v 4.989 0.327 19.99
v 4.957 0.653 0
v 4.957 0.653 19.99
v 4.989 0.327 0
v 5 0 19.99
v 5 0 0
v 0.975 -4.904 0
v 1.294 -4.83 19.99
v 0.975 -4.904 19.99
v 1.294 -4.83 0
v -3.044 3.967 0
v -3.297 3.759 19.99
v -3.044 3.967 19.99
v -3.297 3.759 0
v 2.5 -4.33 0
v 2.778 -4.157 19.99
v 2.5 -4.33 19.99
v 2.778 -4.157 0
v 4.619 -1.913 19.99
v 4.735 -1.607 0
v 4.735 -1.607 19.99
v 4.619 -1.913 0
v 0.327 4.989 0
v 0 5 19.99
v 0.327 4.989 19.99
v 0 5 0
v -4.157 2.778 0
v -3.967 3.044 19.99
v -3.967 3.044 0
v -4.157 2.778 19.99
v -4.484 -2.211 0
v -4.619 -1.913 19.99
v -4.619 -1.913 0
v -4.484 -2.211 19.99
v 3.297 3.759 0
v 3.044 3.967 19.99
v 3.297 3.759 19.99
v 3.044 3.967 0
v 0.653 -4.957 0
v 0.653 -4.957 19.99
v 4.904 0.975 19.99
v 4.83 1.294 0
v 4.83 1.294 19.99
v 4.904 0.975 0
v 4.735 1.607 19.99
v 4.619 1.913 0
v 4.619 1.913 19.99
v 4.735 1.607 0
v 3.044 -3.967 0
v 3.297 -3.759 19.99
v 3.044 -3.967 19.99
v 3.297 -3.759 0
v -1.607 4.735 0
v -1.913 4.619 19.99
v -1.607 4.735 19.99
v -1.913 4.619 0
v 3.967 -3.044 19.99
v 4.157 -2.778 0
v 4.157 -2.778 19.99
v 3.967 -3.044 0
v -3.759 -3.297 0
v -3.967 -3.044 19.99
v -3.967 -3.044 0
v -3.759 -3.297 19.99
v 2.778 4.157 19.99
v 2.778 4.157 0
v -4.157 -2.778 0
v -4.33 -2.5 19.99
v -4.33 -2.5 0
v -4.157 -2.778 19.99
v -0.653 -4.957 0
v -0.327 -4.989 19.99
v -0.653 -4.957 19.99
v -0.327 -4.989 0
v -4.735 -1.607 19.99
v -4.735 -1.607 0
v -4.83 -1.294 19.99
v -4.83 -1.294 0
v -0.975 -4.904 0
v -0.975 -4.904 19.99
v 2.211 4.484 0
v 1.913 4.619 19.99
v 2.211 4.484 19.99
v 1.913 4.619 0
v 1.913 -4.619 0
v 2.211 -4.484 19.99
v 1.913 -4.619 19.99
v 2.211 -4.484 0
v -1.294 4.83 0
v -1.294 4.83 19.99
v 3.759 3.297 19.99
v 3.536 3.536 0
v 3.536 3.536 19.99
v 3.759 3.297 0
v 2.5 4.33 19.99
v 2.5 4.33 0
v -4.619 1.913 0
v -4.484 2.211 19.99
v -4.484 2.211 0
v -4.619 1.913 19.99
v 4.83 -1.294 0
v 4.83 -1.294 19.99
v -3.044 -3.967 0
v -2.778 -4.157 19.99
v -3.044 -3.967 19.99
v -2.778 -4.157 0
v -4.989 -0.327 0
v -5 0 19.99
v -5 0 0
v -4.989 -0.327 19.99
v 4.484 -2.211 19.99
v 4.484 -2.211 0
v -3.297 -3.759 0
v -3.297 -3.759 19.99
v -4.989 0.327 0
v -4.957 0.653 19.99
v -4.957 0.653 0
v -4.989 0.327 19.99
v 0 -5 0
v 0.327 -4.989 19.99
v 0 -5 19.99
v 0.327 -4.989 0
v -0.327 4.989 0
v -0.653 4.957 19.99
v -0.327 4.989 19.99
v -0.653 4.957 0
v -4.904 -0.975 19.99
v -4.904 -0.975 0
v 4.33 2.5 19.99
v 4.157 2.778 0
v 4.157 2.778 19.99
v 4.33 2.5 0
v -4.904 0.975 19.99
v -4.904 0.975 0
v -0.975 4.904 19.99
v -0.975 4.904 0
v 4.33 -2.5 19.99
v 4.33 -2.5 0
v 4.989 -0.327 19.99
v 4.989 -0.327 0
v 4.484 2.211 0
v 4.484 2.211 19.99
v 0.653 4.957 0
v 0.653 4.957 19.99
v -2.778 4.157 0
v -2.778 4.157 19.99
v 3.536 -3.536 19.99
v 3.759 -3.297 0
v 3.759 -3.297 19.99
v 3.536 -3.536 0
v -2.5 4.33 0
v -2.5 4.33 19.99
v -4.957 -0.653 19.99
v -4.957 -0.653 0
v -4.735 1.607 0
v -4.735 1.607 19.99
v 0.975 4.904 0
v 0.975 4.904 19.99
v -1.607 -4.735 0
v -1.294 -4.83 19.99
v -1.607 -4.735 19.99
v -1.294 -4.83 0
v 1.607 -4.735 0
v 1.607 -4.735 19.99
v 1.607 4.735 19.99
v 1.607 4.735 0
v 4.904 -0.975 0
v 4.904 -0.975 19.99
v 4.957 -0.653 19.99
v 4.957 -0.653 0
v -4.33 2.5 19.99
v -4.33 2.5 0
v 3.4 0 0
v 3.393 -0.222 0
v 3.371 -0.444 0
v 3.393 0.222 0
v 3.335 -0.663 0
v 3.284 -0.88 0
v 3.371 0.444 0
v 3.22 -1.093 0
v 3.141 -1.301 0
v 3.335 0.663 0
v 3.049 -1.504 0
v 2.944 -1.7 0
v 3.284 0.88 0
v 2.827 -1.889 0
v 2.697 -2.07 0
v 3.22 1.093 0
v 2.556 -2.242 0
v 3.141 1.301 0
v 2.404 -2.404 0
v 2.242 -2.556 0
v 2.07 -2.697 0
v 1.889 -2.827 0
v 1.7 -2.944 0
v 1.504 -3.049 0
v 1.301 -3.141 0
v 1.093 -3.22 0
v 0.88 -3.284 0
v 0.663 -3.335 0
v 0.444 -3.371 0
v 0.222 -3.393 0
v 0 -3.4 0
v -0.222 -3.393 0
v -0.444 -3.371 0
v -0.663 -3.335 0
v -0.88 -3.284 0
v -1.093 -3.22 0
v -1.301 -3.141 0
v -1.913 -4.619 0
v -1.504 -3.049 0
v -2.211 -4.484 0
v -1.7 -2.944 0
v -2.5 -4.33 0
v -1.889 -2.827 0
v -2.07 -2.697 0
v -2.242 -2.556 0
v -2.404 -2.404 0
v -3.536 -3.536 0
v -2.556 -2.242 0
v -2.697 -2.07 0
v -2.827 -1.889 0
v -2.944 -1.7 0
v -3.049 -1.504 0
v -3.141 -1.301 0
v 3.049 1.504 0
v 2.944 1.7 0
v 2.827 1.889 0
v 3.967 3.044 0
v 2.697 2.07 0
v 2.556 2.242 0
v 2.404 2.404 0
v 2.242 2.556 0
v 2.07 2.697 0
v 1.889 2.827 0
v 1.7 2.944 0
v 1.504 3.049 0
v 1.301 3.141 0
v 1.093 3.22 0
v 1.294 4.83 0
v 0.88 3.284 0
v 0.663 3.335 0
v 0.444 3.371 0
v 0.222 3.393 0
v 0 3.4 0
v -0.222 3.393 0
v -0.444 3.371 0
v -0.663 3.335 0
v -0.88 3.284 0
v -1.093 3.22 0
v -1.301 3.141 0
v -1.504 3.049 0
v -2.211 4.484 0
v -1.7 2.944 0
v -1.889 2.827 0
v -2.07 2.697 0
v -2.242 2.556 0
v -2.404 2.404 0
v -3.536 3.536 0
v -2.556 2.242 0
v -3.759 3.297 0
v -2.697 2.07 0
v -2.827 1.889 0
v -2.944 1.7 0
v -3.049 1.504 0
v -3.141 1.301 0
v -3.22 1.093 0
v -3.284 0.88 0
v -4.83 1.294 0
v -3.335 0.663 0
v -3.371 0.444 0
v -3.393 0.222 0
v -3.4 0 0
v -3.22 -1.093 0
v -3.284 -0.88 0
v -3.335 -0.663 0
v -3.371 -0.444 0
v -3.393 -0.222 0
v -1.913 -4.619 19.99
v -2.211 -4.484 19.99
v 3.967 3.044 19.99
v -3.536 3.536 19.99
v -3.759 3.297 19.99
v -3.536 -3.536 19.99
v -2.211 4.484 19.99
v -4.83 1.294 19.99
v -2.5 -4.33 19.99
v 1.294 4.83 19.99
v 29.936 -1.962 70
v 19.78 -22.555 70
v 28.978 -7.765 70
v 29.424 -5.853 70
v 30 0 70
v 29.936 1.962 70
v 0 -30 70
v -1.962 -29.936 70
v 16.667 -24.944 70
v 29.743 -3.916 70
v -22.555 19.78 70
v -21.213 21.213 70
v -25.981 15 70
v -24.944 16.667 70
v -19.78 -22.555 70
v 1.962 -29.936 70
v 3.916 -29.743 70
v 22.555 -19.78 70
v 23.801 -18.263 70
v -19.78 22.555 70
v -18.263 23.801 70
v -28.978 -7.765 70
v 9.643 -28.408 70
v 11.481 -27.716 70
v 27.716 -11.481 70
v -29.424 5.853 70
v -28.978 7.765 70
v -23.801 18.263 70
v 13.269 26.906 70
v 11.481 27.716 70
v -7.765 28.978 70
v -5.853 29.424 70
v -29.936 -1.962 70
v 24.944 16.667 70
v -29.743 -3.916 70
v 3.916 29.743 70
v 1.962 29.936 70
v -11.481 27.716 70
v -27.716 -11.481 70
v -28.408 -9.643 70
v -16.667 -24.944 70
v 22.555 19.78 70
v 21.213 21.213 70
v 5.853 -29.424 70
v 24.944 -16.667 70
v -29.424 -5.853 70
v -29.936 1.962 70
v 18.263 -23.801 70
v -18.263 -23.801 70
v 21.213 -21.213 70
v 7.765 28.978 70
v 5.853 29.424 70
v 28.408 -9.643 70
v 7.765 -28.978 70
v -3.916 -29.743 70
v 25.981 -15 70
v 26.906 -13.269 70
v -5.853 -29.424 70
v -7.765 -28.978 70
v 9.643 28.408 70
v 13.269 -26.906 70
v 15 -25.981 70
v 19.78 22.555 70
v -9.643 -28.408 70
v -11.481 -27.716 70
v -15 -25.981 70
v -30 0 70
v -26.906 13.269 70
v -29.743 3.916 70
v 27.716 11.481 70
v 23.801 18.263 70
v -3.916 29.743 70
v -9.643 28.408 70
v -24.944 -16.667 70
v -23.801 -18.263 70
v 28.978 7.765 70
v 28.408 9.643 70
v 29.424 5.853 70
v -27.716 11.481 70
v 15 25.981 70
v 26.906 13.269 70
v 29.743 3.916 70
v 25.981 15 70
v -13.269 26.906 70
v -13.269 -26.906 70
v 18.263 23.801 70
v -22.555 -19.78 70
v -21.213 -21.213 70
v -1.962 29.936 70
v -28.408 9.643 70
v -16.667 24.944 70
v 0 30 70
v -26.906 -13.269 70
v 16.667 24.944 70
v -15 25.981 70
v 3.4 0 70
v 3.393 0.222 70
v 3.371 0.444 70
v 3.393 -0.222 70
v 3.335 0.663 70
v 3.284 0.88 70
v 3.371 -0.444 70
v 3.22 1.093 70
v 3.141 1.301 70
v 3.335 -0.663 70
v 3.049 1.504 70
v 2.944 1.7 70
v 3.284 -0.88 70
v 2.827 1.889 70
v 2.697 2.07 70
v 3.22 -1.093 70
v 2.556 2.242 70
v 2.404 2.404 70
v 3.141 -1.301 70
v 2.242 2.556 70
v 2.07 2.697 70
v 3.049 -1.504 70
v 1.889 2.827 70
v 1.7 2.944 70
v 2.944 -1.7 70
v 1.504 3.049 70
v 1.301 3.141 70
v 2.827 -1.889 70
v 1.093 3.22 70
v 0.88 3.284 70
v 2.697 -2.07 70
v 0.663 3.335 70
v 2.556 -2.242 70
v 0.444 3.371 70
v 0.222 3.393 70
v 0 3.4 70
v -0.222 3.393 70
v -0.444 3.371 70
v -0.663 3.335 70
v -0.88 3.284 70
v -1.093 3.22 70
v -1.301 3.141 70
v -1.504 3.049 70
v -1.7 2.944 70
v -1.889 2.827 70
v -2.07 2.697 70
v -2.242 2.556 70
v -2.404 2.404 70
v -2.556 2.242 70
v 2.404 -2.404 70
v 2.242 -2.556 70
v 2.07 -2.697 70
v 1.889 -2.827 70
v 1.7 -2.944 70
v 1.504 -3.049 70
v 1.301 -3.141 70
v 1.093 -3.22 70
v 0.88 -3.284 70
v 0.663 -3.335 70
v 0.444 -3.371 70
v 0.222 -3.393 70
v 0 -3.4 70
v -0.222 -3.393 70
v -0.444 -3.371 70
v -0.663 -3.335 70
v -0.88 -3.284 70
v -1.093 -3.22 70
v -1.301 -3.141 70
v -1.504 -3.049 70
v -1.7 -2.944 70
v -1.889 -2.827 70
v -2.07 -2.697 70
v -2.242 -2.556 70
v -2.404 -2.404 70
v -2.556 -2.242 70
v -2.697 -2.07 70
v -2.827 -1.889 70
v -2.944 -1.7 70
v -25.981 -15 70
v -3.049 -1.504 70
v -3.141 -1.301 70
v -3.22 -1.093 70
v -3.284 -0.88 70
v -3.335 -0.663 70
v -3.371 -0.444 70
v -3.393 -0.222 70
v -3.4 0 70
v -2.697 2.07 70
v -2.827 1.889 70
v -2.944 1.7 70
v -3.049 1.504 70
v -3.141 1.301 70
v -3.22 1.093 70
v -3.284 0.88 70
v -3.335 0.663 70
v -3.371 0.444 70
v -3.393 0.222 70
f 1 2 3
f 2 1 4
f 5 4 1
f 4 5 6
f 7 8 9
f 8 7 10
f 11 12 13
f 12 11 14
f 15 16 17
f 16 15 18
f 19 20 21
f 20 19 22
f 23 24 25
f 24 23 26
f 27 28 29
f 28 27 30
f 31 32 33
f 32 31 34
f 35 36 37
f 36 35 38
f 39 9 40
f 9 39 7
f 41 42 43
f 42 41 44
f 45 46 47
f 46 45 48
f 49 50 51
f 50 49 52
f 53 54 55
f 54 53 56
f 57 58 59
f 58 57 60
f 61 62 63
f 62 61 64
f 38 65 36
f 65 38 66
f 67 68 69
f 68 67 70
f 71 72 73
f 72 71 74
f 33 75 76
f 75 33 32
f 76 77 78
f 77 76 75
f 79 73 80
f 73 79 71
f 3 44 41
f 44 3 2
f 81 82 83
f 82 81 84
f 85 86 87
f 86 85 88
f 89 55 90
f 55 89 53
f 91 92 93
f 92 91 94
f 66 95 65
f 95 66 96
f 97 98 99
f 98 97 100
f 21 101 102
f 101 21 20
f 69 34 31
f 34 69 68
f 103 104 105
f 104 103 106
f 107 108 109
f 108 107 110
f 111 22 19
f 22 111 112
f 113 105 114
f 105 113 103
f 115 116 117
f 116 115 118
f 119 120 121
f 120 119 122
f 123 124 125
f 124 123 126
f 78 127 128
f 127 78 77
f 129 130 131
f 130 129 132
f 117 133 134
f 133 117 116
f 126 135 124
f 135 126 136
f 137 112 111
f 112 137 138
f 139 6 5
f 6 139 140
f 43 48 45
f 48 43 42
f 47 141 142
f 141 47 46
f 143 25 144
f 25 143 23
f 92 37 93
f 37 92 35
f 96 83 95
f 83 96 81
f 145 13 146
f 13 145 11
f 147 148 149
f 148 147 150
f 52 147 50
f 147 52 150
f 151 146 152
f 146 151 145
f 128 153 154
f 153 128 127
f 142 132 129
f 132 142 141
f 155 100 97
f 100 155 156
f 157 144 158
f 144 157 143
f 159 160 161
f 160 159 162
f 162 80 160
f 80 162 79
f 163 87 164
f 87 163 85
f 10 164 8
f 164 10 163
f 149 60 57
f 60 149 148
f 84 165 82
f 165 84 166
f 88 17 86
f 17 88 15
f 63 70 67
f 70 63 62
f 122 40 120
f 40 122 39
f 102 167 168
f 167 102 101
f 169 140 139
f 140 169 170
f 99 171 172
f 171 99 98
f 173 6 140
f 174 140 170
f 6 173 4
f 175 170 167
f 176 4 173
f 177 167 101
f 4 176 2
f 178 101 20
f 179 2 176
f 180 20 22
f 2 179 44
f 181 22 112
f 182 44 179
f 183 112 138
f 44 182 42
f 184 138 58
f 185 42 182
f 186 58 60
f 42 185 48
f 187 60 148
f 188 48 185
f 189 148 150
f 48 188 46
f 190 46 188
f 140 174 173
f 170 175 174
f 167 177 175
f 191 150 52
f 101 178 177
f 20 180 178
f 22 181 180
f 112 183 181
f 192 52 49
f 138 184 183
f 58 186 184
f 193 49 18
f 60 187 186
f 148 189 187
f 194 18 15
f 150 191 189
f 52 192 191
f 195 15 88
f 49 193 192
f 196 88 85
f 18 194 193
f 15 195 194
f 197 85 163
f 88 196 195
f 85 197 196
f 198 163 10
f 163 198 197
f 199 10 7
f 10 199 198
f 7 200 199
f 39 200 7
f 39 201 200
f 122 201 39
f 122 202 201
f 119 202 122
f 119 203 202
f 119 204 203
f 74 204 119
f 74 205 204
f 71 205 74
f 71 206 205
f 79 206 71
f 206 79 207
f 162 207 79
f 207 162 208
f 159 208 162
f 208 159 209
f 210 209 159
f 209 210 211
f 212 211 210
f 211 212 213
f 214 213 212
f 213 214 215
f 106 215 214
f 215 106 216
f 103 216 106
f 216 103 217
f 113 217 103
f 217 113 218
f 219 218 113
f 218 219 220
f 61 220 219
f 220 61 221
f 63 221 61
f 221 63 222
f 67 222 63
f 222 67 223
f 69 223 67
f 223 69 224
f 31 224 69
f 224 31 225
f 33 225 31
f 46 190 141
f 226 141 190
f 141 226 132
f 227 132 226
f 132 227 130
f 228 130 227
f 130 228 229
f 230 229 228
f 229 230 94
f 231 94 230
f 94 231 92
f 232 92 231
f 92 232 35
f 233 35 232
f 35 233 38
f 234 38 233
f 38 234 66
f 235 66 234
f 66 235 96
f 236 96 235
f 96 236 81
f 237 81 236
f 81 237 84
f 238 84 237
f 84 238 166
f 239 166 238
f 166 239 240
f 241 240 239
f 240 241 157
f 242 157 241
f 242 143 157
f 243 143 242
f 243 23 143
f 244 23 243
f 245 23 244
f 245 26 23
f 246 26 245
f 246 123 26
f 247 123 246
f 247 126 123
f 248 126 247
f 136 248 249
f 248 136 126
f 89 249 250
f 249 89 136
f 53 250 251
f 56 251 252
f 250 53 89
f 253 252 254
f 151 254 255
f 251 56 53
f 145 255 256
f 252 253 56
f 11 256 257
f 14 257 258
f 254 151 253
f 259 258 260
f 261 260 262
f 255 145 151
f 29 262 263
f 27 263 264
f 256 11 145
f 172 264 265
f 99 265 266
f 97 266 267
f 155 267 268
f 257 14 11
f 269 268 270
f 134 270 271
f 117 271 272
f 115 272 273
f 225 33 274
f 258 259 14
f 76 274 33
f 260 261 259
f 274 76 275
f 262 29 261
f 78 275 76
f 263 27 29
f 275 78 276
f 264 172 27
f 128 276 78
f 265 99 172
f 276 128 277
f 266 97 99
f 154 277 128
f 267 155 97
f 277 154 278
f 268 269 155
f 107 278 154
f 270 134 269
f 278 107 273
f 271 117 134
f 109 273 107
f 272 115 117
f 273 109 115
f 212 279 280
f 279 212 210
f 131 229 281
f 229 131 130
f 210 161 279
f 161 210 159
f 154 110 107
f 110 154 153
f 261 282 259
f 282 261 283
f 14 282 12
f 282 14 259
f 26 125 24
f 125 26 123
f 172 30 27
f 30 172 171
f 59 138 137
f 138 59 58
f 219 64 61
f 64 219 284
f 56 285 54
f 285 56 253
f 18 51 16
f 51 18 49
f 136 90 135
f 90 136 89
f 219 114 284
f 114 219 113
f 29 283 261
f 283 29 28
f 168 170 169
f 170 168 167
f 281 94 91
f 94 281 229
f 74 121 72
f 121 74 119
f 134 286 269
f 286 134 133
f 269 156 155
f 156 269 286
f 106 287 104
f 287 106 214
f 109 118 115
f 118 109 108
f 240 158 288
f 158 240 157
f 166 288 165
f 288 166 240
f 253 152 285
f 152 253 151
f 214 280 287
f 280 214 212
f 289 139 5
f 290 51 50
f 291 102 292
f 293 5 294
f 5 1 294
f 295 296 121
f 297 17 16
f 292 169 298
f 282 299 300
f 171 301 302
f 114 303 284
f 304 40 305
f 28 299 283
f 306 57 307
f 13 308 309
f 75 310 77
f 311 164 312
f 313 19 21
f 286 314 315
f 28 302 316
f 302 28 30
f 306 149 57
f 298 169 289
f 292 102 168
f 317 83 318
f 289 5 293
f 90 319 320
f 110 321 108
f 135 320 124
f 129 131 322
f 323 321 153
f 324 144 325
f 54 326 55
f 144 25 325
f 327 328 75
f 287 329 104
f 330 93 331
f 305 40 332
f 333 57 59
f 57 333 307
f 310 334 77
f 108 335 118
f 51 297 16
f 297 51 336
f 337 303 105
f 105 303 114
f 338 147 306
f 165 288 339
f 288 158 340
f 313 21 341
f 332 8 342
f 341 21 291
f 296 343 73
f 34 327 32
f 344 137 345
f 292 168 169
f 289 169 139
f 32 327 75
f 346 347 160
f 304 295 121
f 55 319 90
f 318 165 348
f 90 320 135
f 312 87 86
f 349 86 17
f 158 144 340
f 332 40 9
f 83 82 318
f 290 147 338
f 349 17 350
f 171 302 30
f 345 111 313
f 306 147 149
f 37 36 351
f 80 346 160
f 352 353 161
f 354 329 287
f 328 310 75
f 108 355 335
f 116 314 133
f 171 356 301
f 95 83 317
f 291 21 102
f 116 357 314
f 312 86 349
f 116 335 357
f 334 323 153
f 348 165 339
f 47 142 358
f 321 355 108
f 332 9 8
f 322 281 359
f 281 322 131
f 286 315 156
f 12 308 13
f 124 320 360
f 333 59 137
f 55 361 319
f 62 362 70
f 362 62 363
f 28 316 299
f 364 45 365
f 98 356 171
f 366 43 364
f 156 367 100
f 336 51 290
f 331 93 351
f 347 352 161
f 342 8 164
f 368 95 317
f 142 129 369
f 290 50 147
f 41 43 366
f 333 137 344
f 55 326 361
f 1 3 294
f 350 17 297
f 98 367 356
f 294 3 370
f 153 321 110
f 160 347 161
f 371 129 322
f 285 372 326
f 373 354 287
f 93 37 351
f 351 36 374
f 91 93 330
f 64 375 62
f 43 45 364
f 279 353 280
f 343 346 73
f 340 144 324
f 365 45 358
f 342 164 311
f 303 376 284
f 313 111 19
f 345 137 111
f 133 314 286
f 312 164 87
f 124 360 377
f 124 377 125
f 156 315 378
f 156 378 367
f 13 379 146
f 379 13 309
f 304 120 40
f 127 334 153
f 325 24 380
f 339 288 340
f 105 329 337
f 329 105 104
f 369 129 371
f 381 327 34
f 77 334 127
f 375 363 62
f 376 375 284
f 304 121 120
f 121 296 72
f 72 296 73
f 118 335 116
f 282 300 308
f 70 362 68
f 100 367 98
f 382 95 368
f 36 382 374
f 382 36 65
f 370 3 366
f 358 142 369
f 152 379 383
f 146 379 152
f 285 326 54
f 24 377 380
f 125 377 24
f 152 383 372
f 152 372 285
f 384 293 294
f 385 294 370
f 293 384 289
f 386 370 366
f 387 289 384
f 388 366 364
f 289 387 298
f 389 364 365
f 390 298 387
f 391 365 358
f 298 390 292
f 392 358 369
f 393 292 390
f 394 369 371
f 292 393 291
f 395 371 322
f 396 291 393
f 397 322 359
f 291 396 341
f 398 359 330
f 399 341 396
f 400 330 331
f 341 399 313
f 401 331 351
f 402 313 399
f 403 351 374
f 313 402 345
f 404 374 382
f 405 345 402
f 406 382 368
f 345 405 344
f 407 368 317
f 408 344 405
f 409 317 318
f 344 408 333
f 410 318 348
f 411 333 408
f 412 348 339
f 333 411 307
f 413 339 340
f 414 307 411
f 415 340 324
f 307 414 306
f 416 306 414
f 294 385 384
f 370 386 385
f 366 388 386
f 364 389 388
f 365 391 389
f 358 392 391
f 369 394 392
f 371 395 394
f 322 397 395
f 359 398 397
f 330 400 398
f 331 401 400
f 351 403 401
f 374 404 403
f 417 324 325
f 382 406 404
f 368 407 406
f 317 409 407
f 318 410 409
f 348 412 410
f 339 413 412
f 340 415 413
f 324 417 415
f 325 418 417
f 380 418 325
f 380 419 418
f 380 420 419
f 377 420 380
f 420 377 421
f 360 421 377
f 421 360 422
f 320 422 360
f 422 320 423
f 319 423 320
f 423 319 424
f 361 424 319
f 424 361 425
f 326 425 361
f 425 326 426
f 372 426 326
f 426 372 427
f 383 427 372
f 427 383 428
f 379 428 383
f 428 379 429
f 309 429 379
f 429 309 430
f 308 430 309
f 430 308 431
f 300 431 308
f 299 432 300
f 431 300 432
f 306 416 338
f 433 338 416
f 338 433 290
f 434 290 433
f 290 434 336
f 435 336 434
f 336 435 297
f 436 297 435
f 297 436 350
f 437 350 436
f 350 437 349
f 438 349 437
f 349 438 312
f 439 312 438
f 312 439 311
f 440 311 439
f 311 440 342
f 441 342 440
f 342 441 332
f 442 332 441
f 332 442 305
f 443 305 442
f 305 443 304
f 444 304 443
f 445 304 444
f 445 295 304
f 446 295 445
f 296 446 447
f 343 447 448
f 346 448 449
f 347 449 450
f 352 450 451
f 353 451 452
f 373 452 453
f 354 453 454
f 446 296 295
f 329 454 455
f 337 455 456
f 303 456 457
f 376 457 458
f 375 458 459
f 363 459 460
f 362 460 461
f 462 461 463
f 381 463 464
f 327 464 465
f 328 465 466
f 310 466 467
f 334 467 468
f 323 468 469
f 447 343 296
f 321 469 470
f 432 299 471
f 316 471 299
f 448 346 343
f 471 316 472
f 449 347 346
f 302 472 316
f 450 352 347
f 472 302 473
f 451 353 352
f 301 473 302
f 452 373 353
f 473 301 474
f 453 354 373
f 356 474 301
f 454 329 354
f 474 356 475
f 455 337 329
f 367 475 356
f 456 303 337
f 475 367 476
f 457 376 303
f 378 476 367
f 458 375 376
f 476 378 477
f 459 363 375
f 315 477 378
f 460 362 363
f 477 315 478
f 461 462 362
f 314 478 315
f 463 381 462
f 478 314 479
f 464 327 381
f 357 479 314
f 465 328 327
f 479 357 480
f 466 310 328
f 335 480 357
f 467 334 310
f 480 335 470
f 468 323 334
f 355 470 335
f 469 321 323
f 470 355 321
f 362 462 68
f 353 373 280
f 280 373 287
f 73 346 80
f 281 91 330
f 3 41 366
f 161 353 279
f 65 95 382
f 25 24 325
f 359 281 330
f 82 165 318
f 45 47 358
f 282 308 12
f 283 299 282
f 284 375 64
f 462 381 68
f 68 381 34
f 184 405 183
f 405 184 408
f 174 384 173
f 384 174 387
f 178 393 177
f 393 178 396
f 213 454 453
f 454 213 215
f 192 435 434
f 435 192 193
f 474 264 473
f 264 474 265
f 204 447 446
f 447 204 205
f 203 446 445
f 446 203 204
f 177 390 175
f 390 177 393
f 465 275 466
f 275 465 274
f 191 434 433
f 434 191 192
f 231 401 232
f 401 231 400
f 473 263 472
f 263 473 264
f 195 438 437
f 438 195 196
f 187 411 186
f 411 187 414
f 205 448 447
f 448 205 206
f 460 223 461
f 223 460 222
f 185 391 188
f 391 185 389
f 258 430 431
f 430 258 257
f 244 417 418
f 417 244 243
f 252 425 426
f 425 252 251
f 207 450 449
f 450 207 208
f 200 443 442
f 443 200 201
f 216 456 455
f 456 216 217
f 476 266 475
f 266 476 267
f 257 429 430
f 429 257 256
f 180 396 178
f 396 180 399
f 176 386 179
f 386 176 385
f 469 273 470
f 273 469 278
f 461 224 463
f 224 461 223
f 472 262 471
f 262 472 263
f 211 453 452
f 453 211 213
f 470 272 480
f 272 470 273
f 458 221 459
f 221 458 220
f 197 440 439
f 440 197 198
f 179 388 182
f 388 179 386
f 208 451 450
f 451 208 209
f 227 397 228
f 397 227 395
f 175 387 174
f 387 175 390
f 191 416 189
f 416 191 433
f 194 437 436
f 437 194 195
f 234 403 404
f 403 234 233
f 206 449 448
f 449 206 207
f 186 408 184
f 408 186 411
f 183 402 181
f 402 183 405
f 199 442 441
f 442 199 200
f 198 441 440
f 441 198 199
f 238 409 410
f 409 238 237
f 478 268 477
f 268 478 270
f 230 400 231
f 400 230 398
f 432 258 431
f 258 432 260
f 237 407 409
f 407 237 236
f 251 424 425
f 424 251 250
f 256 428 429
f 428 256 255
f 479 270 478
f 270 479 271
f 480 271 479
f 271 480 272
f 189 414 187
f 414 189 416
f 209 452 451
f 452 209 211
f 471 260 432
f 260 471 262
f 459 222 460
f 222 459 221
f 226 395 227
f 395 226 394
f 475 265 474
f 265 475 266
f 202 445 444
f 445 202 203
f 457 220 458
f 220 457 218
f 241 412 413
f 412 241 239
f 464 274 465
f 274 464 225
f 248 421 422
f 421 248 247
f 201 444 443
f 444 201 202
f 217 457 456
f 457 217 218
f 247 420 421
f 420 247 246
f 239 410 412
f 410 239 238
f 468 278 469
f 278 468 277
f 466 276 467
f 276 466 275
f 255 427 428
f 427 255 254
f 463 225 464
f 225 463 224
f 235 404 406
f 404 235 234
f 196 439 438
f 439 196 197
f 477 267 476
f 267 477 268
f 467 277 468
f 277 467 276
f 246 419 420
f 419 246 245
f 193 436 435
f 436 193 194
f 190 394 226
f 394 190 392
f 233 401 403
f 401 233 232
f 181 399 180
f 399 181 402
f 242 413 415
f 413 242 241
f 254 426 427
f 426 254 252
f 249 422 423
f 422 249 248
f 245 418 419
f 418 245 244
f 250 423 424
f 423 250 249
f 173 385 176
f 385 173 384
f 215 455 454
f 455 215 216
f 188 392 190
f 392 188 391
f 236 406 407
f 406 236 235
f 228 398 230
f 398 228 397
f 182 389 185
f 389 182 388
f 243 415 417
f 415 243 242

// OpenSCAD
// Lab funnel - printed upright, open at top and bottom
// Units: mm

// ---- Parameters ----
spout_od      = 10;    // spout outer diameter
spout_id      = spout_od - 2 * 1.6;  // spout bore (6.8)
spout_h       = 20;    // spout height (z = 0 to 20)
cone_top_d    = 10;    // cone diameter where it meets the spout (z = 20)
cone_rim_d    = 60;    // cone rim diameter (z = 50)
cone_h        = cone_rim_d - cone_top_d;  // cone height (30)
wall          = 1.6;   // uniform wall thickness
eps           = 0.5;   // cutter overshoot past faces

$fn = 96;

// ---- Model ----
difference() {
    union() {
        // Spout (tube)
        cylinder(d = spout_od, h = spout_h);
        // Cone, slightly overlapping the spout for a clean union
        translate([0, 0, spout_h - 0.01])
            cylinder(d1 = cone_top_d, d2 = cone_rim_d, h = cone_h + 0.01);
    }
    // Through-bore: spout bore up to the cone, then cone wall thickness
    translate([0, 0, -eps])
        linear_extrude(height = spout_h + cone_h + 2 * eps)
            circle(d = spout_id);
}
